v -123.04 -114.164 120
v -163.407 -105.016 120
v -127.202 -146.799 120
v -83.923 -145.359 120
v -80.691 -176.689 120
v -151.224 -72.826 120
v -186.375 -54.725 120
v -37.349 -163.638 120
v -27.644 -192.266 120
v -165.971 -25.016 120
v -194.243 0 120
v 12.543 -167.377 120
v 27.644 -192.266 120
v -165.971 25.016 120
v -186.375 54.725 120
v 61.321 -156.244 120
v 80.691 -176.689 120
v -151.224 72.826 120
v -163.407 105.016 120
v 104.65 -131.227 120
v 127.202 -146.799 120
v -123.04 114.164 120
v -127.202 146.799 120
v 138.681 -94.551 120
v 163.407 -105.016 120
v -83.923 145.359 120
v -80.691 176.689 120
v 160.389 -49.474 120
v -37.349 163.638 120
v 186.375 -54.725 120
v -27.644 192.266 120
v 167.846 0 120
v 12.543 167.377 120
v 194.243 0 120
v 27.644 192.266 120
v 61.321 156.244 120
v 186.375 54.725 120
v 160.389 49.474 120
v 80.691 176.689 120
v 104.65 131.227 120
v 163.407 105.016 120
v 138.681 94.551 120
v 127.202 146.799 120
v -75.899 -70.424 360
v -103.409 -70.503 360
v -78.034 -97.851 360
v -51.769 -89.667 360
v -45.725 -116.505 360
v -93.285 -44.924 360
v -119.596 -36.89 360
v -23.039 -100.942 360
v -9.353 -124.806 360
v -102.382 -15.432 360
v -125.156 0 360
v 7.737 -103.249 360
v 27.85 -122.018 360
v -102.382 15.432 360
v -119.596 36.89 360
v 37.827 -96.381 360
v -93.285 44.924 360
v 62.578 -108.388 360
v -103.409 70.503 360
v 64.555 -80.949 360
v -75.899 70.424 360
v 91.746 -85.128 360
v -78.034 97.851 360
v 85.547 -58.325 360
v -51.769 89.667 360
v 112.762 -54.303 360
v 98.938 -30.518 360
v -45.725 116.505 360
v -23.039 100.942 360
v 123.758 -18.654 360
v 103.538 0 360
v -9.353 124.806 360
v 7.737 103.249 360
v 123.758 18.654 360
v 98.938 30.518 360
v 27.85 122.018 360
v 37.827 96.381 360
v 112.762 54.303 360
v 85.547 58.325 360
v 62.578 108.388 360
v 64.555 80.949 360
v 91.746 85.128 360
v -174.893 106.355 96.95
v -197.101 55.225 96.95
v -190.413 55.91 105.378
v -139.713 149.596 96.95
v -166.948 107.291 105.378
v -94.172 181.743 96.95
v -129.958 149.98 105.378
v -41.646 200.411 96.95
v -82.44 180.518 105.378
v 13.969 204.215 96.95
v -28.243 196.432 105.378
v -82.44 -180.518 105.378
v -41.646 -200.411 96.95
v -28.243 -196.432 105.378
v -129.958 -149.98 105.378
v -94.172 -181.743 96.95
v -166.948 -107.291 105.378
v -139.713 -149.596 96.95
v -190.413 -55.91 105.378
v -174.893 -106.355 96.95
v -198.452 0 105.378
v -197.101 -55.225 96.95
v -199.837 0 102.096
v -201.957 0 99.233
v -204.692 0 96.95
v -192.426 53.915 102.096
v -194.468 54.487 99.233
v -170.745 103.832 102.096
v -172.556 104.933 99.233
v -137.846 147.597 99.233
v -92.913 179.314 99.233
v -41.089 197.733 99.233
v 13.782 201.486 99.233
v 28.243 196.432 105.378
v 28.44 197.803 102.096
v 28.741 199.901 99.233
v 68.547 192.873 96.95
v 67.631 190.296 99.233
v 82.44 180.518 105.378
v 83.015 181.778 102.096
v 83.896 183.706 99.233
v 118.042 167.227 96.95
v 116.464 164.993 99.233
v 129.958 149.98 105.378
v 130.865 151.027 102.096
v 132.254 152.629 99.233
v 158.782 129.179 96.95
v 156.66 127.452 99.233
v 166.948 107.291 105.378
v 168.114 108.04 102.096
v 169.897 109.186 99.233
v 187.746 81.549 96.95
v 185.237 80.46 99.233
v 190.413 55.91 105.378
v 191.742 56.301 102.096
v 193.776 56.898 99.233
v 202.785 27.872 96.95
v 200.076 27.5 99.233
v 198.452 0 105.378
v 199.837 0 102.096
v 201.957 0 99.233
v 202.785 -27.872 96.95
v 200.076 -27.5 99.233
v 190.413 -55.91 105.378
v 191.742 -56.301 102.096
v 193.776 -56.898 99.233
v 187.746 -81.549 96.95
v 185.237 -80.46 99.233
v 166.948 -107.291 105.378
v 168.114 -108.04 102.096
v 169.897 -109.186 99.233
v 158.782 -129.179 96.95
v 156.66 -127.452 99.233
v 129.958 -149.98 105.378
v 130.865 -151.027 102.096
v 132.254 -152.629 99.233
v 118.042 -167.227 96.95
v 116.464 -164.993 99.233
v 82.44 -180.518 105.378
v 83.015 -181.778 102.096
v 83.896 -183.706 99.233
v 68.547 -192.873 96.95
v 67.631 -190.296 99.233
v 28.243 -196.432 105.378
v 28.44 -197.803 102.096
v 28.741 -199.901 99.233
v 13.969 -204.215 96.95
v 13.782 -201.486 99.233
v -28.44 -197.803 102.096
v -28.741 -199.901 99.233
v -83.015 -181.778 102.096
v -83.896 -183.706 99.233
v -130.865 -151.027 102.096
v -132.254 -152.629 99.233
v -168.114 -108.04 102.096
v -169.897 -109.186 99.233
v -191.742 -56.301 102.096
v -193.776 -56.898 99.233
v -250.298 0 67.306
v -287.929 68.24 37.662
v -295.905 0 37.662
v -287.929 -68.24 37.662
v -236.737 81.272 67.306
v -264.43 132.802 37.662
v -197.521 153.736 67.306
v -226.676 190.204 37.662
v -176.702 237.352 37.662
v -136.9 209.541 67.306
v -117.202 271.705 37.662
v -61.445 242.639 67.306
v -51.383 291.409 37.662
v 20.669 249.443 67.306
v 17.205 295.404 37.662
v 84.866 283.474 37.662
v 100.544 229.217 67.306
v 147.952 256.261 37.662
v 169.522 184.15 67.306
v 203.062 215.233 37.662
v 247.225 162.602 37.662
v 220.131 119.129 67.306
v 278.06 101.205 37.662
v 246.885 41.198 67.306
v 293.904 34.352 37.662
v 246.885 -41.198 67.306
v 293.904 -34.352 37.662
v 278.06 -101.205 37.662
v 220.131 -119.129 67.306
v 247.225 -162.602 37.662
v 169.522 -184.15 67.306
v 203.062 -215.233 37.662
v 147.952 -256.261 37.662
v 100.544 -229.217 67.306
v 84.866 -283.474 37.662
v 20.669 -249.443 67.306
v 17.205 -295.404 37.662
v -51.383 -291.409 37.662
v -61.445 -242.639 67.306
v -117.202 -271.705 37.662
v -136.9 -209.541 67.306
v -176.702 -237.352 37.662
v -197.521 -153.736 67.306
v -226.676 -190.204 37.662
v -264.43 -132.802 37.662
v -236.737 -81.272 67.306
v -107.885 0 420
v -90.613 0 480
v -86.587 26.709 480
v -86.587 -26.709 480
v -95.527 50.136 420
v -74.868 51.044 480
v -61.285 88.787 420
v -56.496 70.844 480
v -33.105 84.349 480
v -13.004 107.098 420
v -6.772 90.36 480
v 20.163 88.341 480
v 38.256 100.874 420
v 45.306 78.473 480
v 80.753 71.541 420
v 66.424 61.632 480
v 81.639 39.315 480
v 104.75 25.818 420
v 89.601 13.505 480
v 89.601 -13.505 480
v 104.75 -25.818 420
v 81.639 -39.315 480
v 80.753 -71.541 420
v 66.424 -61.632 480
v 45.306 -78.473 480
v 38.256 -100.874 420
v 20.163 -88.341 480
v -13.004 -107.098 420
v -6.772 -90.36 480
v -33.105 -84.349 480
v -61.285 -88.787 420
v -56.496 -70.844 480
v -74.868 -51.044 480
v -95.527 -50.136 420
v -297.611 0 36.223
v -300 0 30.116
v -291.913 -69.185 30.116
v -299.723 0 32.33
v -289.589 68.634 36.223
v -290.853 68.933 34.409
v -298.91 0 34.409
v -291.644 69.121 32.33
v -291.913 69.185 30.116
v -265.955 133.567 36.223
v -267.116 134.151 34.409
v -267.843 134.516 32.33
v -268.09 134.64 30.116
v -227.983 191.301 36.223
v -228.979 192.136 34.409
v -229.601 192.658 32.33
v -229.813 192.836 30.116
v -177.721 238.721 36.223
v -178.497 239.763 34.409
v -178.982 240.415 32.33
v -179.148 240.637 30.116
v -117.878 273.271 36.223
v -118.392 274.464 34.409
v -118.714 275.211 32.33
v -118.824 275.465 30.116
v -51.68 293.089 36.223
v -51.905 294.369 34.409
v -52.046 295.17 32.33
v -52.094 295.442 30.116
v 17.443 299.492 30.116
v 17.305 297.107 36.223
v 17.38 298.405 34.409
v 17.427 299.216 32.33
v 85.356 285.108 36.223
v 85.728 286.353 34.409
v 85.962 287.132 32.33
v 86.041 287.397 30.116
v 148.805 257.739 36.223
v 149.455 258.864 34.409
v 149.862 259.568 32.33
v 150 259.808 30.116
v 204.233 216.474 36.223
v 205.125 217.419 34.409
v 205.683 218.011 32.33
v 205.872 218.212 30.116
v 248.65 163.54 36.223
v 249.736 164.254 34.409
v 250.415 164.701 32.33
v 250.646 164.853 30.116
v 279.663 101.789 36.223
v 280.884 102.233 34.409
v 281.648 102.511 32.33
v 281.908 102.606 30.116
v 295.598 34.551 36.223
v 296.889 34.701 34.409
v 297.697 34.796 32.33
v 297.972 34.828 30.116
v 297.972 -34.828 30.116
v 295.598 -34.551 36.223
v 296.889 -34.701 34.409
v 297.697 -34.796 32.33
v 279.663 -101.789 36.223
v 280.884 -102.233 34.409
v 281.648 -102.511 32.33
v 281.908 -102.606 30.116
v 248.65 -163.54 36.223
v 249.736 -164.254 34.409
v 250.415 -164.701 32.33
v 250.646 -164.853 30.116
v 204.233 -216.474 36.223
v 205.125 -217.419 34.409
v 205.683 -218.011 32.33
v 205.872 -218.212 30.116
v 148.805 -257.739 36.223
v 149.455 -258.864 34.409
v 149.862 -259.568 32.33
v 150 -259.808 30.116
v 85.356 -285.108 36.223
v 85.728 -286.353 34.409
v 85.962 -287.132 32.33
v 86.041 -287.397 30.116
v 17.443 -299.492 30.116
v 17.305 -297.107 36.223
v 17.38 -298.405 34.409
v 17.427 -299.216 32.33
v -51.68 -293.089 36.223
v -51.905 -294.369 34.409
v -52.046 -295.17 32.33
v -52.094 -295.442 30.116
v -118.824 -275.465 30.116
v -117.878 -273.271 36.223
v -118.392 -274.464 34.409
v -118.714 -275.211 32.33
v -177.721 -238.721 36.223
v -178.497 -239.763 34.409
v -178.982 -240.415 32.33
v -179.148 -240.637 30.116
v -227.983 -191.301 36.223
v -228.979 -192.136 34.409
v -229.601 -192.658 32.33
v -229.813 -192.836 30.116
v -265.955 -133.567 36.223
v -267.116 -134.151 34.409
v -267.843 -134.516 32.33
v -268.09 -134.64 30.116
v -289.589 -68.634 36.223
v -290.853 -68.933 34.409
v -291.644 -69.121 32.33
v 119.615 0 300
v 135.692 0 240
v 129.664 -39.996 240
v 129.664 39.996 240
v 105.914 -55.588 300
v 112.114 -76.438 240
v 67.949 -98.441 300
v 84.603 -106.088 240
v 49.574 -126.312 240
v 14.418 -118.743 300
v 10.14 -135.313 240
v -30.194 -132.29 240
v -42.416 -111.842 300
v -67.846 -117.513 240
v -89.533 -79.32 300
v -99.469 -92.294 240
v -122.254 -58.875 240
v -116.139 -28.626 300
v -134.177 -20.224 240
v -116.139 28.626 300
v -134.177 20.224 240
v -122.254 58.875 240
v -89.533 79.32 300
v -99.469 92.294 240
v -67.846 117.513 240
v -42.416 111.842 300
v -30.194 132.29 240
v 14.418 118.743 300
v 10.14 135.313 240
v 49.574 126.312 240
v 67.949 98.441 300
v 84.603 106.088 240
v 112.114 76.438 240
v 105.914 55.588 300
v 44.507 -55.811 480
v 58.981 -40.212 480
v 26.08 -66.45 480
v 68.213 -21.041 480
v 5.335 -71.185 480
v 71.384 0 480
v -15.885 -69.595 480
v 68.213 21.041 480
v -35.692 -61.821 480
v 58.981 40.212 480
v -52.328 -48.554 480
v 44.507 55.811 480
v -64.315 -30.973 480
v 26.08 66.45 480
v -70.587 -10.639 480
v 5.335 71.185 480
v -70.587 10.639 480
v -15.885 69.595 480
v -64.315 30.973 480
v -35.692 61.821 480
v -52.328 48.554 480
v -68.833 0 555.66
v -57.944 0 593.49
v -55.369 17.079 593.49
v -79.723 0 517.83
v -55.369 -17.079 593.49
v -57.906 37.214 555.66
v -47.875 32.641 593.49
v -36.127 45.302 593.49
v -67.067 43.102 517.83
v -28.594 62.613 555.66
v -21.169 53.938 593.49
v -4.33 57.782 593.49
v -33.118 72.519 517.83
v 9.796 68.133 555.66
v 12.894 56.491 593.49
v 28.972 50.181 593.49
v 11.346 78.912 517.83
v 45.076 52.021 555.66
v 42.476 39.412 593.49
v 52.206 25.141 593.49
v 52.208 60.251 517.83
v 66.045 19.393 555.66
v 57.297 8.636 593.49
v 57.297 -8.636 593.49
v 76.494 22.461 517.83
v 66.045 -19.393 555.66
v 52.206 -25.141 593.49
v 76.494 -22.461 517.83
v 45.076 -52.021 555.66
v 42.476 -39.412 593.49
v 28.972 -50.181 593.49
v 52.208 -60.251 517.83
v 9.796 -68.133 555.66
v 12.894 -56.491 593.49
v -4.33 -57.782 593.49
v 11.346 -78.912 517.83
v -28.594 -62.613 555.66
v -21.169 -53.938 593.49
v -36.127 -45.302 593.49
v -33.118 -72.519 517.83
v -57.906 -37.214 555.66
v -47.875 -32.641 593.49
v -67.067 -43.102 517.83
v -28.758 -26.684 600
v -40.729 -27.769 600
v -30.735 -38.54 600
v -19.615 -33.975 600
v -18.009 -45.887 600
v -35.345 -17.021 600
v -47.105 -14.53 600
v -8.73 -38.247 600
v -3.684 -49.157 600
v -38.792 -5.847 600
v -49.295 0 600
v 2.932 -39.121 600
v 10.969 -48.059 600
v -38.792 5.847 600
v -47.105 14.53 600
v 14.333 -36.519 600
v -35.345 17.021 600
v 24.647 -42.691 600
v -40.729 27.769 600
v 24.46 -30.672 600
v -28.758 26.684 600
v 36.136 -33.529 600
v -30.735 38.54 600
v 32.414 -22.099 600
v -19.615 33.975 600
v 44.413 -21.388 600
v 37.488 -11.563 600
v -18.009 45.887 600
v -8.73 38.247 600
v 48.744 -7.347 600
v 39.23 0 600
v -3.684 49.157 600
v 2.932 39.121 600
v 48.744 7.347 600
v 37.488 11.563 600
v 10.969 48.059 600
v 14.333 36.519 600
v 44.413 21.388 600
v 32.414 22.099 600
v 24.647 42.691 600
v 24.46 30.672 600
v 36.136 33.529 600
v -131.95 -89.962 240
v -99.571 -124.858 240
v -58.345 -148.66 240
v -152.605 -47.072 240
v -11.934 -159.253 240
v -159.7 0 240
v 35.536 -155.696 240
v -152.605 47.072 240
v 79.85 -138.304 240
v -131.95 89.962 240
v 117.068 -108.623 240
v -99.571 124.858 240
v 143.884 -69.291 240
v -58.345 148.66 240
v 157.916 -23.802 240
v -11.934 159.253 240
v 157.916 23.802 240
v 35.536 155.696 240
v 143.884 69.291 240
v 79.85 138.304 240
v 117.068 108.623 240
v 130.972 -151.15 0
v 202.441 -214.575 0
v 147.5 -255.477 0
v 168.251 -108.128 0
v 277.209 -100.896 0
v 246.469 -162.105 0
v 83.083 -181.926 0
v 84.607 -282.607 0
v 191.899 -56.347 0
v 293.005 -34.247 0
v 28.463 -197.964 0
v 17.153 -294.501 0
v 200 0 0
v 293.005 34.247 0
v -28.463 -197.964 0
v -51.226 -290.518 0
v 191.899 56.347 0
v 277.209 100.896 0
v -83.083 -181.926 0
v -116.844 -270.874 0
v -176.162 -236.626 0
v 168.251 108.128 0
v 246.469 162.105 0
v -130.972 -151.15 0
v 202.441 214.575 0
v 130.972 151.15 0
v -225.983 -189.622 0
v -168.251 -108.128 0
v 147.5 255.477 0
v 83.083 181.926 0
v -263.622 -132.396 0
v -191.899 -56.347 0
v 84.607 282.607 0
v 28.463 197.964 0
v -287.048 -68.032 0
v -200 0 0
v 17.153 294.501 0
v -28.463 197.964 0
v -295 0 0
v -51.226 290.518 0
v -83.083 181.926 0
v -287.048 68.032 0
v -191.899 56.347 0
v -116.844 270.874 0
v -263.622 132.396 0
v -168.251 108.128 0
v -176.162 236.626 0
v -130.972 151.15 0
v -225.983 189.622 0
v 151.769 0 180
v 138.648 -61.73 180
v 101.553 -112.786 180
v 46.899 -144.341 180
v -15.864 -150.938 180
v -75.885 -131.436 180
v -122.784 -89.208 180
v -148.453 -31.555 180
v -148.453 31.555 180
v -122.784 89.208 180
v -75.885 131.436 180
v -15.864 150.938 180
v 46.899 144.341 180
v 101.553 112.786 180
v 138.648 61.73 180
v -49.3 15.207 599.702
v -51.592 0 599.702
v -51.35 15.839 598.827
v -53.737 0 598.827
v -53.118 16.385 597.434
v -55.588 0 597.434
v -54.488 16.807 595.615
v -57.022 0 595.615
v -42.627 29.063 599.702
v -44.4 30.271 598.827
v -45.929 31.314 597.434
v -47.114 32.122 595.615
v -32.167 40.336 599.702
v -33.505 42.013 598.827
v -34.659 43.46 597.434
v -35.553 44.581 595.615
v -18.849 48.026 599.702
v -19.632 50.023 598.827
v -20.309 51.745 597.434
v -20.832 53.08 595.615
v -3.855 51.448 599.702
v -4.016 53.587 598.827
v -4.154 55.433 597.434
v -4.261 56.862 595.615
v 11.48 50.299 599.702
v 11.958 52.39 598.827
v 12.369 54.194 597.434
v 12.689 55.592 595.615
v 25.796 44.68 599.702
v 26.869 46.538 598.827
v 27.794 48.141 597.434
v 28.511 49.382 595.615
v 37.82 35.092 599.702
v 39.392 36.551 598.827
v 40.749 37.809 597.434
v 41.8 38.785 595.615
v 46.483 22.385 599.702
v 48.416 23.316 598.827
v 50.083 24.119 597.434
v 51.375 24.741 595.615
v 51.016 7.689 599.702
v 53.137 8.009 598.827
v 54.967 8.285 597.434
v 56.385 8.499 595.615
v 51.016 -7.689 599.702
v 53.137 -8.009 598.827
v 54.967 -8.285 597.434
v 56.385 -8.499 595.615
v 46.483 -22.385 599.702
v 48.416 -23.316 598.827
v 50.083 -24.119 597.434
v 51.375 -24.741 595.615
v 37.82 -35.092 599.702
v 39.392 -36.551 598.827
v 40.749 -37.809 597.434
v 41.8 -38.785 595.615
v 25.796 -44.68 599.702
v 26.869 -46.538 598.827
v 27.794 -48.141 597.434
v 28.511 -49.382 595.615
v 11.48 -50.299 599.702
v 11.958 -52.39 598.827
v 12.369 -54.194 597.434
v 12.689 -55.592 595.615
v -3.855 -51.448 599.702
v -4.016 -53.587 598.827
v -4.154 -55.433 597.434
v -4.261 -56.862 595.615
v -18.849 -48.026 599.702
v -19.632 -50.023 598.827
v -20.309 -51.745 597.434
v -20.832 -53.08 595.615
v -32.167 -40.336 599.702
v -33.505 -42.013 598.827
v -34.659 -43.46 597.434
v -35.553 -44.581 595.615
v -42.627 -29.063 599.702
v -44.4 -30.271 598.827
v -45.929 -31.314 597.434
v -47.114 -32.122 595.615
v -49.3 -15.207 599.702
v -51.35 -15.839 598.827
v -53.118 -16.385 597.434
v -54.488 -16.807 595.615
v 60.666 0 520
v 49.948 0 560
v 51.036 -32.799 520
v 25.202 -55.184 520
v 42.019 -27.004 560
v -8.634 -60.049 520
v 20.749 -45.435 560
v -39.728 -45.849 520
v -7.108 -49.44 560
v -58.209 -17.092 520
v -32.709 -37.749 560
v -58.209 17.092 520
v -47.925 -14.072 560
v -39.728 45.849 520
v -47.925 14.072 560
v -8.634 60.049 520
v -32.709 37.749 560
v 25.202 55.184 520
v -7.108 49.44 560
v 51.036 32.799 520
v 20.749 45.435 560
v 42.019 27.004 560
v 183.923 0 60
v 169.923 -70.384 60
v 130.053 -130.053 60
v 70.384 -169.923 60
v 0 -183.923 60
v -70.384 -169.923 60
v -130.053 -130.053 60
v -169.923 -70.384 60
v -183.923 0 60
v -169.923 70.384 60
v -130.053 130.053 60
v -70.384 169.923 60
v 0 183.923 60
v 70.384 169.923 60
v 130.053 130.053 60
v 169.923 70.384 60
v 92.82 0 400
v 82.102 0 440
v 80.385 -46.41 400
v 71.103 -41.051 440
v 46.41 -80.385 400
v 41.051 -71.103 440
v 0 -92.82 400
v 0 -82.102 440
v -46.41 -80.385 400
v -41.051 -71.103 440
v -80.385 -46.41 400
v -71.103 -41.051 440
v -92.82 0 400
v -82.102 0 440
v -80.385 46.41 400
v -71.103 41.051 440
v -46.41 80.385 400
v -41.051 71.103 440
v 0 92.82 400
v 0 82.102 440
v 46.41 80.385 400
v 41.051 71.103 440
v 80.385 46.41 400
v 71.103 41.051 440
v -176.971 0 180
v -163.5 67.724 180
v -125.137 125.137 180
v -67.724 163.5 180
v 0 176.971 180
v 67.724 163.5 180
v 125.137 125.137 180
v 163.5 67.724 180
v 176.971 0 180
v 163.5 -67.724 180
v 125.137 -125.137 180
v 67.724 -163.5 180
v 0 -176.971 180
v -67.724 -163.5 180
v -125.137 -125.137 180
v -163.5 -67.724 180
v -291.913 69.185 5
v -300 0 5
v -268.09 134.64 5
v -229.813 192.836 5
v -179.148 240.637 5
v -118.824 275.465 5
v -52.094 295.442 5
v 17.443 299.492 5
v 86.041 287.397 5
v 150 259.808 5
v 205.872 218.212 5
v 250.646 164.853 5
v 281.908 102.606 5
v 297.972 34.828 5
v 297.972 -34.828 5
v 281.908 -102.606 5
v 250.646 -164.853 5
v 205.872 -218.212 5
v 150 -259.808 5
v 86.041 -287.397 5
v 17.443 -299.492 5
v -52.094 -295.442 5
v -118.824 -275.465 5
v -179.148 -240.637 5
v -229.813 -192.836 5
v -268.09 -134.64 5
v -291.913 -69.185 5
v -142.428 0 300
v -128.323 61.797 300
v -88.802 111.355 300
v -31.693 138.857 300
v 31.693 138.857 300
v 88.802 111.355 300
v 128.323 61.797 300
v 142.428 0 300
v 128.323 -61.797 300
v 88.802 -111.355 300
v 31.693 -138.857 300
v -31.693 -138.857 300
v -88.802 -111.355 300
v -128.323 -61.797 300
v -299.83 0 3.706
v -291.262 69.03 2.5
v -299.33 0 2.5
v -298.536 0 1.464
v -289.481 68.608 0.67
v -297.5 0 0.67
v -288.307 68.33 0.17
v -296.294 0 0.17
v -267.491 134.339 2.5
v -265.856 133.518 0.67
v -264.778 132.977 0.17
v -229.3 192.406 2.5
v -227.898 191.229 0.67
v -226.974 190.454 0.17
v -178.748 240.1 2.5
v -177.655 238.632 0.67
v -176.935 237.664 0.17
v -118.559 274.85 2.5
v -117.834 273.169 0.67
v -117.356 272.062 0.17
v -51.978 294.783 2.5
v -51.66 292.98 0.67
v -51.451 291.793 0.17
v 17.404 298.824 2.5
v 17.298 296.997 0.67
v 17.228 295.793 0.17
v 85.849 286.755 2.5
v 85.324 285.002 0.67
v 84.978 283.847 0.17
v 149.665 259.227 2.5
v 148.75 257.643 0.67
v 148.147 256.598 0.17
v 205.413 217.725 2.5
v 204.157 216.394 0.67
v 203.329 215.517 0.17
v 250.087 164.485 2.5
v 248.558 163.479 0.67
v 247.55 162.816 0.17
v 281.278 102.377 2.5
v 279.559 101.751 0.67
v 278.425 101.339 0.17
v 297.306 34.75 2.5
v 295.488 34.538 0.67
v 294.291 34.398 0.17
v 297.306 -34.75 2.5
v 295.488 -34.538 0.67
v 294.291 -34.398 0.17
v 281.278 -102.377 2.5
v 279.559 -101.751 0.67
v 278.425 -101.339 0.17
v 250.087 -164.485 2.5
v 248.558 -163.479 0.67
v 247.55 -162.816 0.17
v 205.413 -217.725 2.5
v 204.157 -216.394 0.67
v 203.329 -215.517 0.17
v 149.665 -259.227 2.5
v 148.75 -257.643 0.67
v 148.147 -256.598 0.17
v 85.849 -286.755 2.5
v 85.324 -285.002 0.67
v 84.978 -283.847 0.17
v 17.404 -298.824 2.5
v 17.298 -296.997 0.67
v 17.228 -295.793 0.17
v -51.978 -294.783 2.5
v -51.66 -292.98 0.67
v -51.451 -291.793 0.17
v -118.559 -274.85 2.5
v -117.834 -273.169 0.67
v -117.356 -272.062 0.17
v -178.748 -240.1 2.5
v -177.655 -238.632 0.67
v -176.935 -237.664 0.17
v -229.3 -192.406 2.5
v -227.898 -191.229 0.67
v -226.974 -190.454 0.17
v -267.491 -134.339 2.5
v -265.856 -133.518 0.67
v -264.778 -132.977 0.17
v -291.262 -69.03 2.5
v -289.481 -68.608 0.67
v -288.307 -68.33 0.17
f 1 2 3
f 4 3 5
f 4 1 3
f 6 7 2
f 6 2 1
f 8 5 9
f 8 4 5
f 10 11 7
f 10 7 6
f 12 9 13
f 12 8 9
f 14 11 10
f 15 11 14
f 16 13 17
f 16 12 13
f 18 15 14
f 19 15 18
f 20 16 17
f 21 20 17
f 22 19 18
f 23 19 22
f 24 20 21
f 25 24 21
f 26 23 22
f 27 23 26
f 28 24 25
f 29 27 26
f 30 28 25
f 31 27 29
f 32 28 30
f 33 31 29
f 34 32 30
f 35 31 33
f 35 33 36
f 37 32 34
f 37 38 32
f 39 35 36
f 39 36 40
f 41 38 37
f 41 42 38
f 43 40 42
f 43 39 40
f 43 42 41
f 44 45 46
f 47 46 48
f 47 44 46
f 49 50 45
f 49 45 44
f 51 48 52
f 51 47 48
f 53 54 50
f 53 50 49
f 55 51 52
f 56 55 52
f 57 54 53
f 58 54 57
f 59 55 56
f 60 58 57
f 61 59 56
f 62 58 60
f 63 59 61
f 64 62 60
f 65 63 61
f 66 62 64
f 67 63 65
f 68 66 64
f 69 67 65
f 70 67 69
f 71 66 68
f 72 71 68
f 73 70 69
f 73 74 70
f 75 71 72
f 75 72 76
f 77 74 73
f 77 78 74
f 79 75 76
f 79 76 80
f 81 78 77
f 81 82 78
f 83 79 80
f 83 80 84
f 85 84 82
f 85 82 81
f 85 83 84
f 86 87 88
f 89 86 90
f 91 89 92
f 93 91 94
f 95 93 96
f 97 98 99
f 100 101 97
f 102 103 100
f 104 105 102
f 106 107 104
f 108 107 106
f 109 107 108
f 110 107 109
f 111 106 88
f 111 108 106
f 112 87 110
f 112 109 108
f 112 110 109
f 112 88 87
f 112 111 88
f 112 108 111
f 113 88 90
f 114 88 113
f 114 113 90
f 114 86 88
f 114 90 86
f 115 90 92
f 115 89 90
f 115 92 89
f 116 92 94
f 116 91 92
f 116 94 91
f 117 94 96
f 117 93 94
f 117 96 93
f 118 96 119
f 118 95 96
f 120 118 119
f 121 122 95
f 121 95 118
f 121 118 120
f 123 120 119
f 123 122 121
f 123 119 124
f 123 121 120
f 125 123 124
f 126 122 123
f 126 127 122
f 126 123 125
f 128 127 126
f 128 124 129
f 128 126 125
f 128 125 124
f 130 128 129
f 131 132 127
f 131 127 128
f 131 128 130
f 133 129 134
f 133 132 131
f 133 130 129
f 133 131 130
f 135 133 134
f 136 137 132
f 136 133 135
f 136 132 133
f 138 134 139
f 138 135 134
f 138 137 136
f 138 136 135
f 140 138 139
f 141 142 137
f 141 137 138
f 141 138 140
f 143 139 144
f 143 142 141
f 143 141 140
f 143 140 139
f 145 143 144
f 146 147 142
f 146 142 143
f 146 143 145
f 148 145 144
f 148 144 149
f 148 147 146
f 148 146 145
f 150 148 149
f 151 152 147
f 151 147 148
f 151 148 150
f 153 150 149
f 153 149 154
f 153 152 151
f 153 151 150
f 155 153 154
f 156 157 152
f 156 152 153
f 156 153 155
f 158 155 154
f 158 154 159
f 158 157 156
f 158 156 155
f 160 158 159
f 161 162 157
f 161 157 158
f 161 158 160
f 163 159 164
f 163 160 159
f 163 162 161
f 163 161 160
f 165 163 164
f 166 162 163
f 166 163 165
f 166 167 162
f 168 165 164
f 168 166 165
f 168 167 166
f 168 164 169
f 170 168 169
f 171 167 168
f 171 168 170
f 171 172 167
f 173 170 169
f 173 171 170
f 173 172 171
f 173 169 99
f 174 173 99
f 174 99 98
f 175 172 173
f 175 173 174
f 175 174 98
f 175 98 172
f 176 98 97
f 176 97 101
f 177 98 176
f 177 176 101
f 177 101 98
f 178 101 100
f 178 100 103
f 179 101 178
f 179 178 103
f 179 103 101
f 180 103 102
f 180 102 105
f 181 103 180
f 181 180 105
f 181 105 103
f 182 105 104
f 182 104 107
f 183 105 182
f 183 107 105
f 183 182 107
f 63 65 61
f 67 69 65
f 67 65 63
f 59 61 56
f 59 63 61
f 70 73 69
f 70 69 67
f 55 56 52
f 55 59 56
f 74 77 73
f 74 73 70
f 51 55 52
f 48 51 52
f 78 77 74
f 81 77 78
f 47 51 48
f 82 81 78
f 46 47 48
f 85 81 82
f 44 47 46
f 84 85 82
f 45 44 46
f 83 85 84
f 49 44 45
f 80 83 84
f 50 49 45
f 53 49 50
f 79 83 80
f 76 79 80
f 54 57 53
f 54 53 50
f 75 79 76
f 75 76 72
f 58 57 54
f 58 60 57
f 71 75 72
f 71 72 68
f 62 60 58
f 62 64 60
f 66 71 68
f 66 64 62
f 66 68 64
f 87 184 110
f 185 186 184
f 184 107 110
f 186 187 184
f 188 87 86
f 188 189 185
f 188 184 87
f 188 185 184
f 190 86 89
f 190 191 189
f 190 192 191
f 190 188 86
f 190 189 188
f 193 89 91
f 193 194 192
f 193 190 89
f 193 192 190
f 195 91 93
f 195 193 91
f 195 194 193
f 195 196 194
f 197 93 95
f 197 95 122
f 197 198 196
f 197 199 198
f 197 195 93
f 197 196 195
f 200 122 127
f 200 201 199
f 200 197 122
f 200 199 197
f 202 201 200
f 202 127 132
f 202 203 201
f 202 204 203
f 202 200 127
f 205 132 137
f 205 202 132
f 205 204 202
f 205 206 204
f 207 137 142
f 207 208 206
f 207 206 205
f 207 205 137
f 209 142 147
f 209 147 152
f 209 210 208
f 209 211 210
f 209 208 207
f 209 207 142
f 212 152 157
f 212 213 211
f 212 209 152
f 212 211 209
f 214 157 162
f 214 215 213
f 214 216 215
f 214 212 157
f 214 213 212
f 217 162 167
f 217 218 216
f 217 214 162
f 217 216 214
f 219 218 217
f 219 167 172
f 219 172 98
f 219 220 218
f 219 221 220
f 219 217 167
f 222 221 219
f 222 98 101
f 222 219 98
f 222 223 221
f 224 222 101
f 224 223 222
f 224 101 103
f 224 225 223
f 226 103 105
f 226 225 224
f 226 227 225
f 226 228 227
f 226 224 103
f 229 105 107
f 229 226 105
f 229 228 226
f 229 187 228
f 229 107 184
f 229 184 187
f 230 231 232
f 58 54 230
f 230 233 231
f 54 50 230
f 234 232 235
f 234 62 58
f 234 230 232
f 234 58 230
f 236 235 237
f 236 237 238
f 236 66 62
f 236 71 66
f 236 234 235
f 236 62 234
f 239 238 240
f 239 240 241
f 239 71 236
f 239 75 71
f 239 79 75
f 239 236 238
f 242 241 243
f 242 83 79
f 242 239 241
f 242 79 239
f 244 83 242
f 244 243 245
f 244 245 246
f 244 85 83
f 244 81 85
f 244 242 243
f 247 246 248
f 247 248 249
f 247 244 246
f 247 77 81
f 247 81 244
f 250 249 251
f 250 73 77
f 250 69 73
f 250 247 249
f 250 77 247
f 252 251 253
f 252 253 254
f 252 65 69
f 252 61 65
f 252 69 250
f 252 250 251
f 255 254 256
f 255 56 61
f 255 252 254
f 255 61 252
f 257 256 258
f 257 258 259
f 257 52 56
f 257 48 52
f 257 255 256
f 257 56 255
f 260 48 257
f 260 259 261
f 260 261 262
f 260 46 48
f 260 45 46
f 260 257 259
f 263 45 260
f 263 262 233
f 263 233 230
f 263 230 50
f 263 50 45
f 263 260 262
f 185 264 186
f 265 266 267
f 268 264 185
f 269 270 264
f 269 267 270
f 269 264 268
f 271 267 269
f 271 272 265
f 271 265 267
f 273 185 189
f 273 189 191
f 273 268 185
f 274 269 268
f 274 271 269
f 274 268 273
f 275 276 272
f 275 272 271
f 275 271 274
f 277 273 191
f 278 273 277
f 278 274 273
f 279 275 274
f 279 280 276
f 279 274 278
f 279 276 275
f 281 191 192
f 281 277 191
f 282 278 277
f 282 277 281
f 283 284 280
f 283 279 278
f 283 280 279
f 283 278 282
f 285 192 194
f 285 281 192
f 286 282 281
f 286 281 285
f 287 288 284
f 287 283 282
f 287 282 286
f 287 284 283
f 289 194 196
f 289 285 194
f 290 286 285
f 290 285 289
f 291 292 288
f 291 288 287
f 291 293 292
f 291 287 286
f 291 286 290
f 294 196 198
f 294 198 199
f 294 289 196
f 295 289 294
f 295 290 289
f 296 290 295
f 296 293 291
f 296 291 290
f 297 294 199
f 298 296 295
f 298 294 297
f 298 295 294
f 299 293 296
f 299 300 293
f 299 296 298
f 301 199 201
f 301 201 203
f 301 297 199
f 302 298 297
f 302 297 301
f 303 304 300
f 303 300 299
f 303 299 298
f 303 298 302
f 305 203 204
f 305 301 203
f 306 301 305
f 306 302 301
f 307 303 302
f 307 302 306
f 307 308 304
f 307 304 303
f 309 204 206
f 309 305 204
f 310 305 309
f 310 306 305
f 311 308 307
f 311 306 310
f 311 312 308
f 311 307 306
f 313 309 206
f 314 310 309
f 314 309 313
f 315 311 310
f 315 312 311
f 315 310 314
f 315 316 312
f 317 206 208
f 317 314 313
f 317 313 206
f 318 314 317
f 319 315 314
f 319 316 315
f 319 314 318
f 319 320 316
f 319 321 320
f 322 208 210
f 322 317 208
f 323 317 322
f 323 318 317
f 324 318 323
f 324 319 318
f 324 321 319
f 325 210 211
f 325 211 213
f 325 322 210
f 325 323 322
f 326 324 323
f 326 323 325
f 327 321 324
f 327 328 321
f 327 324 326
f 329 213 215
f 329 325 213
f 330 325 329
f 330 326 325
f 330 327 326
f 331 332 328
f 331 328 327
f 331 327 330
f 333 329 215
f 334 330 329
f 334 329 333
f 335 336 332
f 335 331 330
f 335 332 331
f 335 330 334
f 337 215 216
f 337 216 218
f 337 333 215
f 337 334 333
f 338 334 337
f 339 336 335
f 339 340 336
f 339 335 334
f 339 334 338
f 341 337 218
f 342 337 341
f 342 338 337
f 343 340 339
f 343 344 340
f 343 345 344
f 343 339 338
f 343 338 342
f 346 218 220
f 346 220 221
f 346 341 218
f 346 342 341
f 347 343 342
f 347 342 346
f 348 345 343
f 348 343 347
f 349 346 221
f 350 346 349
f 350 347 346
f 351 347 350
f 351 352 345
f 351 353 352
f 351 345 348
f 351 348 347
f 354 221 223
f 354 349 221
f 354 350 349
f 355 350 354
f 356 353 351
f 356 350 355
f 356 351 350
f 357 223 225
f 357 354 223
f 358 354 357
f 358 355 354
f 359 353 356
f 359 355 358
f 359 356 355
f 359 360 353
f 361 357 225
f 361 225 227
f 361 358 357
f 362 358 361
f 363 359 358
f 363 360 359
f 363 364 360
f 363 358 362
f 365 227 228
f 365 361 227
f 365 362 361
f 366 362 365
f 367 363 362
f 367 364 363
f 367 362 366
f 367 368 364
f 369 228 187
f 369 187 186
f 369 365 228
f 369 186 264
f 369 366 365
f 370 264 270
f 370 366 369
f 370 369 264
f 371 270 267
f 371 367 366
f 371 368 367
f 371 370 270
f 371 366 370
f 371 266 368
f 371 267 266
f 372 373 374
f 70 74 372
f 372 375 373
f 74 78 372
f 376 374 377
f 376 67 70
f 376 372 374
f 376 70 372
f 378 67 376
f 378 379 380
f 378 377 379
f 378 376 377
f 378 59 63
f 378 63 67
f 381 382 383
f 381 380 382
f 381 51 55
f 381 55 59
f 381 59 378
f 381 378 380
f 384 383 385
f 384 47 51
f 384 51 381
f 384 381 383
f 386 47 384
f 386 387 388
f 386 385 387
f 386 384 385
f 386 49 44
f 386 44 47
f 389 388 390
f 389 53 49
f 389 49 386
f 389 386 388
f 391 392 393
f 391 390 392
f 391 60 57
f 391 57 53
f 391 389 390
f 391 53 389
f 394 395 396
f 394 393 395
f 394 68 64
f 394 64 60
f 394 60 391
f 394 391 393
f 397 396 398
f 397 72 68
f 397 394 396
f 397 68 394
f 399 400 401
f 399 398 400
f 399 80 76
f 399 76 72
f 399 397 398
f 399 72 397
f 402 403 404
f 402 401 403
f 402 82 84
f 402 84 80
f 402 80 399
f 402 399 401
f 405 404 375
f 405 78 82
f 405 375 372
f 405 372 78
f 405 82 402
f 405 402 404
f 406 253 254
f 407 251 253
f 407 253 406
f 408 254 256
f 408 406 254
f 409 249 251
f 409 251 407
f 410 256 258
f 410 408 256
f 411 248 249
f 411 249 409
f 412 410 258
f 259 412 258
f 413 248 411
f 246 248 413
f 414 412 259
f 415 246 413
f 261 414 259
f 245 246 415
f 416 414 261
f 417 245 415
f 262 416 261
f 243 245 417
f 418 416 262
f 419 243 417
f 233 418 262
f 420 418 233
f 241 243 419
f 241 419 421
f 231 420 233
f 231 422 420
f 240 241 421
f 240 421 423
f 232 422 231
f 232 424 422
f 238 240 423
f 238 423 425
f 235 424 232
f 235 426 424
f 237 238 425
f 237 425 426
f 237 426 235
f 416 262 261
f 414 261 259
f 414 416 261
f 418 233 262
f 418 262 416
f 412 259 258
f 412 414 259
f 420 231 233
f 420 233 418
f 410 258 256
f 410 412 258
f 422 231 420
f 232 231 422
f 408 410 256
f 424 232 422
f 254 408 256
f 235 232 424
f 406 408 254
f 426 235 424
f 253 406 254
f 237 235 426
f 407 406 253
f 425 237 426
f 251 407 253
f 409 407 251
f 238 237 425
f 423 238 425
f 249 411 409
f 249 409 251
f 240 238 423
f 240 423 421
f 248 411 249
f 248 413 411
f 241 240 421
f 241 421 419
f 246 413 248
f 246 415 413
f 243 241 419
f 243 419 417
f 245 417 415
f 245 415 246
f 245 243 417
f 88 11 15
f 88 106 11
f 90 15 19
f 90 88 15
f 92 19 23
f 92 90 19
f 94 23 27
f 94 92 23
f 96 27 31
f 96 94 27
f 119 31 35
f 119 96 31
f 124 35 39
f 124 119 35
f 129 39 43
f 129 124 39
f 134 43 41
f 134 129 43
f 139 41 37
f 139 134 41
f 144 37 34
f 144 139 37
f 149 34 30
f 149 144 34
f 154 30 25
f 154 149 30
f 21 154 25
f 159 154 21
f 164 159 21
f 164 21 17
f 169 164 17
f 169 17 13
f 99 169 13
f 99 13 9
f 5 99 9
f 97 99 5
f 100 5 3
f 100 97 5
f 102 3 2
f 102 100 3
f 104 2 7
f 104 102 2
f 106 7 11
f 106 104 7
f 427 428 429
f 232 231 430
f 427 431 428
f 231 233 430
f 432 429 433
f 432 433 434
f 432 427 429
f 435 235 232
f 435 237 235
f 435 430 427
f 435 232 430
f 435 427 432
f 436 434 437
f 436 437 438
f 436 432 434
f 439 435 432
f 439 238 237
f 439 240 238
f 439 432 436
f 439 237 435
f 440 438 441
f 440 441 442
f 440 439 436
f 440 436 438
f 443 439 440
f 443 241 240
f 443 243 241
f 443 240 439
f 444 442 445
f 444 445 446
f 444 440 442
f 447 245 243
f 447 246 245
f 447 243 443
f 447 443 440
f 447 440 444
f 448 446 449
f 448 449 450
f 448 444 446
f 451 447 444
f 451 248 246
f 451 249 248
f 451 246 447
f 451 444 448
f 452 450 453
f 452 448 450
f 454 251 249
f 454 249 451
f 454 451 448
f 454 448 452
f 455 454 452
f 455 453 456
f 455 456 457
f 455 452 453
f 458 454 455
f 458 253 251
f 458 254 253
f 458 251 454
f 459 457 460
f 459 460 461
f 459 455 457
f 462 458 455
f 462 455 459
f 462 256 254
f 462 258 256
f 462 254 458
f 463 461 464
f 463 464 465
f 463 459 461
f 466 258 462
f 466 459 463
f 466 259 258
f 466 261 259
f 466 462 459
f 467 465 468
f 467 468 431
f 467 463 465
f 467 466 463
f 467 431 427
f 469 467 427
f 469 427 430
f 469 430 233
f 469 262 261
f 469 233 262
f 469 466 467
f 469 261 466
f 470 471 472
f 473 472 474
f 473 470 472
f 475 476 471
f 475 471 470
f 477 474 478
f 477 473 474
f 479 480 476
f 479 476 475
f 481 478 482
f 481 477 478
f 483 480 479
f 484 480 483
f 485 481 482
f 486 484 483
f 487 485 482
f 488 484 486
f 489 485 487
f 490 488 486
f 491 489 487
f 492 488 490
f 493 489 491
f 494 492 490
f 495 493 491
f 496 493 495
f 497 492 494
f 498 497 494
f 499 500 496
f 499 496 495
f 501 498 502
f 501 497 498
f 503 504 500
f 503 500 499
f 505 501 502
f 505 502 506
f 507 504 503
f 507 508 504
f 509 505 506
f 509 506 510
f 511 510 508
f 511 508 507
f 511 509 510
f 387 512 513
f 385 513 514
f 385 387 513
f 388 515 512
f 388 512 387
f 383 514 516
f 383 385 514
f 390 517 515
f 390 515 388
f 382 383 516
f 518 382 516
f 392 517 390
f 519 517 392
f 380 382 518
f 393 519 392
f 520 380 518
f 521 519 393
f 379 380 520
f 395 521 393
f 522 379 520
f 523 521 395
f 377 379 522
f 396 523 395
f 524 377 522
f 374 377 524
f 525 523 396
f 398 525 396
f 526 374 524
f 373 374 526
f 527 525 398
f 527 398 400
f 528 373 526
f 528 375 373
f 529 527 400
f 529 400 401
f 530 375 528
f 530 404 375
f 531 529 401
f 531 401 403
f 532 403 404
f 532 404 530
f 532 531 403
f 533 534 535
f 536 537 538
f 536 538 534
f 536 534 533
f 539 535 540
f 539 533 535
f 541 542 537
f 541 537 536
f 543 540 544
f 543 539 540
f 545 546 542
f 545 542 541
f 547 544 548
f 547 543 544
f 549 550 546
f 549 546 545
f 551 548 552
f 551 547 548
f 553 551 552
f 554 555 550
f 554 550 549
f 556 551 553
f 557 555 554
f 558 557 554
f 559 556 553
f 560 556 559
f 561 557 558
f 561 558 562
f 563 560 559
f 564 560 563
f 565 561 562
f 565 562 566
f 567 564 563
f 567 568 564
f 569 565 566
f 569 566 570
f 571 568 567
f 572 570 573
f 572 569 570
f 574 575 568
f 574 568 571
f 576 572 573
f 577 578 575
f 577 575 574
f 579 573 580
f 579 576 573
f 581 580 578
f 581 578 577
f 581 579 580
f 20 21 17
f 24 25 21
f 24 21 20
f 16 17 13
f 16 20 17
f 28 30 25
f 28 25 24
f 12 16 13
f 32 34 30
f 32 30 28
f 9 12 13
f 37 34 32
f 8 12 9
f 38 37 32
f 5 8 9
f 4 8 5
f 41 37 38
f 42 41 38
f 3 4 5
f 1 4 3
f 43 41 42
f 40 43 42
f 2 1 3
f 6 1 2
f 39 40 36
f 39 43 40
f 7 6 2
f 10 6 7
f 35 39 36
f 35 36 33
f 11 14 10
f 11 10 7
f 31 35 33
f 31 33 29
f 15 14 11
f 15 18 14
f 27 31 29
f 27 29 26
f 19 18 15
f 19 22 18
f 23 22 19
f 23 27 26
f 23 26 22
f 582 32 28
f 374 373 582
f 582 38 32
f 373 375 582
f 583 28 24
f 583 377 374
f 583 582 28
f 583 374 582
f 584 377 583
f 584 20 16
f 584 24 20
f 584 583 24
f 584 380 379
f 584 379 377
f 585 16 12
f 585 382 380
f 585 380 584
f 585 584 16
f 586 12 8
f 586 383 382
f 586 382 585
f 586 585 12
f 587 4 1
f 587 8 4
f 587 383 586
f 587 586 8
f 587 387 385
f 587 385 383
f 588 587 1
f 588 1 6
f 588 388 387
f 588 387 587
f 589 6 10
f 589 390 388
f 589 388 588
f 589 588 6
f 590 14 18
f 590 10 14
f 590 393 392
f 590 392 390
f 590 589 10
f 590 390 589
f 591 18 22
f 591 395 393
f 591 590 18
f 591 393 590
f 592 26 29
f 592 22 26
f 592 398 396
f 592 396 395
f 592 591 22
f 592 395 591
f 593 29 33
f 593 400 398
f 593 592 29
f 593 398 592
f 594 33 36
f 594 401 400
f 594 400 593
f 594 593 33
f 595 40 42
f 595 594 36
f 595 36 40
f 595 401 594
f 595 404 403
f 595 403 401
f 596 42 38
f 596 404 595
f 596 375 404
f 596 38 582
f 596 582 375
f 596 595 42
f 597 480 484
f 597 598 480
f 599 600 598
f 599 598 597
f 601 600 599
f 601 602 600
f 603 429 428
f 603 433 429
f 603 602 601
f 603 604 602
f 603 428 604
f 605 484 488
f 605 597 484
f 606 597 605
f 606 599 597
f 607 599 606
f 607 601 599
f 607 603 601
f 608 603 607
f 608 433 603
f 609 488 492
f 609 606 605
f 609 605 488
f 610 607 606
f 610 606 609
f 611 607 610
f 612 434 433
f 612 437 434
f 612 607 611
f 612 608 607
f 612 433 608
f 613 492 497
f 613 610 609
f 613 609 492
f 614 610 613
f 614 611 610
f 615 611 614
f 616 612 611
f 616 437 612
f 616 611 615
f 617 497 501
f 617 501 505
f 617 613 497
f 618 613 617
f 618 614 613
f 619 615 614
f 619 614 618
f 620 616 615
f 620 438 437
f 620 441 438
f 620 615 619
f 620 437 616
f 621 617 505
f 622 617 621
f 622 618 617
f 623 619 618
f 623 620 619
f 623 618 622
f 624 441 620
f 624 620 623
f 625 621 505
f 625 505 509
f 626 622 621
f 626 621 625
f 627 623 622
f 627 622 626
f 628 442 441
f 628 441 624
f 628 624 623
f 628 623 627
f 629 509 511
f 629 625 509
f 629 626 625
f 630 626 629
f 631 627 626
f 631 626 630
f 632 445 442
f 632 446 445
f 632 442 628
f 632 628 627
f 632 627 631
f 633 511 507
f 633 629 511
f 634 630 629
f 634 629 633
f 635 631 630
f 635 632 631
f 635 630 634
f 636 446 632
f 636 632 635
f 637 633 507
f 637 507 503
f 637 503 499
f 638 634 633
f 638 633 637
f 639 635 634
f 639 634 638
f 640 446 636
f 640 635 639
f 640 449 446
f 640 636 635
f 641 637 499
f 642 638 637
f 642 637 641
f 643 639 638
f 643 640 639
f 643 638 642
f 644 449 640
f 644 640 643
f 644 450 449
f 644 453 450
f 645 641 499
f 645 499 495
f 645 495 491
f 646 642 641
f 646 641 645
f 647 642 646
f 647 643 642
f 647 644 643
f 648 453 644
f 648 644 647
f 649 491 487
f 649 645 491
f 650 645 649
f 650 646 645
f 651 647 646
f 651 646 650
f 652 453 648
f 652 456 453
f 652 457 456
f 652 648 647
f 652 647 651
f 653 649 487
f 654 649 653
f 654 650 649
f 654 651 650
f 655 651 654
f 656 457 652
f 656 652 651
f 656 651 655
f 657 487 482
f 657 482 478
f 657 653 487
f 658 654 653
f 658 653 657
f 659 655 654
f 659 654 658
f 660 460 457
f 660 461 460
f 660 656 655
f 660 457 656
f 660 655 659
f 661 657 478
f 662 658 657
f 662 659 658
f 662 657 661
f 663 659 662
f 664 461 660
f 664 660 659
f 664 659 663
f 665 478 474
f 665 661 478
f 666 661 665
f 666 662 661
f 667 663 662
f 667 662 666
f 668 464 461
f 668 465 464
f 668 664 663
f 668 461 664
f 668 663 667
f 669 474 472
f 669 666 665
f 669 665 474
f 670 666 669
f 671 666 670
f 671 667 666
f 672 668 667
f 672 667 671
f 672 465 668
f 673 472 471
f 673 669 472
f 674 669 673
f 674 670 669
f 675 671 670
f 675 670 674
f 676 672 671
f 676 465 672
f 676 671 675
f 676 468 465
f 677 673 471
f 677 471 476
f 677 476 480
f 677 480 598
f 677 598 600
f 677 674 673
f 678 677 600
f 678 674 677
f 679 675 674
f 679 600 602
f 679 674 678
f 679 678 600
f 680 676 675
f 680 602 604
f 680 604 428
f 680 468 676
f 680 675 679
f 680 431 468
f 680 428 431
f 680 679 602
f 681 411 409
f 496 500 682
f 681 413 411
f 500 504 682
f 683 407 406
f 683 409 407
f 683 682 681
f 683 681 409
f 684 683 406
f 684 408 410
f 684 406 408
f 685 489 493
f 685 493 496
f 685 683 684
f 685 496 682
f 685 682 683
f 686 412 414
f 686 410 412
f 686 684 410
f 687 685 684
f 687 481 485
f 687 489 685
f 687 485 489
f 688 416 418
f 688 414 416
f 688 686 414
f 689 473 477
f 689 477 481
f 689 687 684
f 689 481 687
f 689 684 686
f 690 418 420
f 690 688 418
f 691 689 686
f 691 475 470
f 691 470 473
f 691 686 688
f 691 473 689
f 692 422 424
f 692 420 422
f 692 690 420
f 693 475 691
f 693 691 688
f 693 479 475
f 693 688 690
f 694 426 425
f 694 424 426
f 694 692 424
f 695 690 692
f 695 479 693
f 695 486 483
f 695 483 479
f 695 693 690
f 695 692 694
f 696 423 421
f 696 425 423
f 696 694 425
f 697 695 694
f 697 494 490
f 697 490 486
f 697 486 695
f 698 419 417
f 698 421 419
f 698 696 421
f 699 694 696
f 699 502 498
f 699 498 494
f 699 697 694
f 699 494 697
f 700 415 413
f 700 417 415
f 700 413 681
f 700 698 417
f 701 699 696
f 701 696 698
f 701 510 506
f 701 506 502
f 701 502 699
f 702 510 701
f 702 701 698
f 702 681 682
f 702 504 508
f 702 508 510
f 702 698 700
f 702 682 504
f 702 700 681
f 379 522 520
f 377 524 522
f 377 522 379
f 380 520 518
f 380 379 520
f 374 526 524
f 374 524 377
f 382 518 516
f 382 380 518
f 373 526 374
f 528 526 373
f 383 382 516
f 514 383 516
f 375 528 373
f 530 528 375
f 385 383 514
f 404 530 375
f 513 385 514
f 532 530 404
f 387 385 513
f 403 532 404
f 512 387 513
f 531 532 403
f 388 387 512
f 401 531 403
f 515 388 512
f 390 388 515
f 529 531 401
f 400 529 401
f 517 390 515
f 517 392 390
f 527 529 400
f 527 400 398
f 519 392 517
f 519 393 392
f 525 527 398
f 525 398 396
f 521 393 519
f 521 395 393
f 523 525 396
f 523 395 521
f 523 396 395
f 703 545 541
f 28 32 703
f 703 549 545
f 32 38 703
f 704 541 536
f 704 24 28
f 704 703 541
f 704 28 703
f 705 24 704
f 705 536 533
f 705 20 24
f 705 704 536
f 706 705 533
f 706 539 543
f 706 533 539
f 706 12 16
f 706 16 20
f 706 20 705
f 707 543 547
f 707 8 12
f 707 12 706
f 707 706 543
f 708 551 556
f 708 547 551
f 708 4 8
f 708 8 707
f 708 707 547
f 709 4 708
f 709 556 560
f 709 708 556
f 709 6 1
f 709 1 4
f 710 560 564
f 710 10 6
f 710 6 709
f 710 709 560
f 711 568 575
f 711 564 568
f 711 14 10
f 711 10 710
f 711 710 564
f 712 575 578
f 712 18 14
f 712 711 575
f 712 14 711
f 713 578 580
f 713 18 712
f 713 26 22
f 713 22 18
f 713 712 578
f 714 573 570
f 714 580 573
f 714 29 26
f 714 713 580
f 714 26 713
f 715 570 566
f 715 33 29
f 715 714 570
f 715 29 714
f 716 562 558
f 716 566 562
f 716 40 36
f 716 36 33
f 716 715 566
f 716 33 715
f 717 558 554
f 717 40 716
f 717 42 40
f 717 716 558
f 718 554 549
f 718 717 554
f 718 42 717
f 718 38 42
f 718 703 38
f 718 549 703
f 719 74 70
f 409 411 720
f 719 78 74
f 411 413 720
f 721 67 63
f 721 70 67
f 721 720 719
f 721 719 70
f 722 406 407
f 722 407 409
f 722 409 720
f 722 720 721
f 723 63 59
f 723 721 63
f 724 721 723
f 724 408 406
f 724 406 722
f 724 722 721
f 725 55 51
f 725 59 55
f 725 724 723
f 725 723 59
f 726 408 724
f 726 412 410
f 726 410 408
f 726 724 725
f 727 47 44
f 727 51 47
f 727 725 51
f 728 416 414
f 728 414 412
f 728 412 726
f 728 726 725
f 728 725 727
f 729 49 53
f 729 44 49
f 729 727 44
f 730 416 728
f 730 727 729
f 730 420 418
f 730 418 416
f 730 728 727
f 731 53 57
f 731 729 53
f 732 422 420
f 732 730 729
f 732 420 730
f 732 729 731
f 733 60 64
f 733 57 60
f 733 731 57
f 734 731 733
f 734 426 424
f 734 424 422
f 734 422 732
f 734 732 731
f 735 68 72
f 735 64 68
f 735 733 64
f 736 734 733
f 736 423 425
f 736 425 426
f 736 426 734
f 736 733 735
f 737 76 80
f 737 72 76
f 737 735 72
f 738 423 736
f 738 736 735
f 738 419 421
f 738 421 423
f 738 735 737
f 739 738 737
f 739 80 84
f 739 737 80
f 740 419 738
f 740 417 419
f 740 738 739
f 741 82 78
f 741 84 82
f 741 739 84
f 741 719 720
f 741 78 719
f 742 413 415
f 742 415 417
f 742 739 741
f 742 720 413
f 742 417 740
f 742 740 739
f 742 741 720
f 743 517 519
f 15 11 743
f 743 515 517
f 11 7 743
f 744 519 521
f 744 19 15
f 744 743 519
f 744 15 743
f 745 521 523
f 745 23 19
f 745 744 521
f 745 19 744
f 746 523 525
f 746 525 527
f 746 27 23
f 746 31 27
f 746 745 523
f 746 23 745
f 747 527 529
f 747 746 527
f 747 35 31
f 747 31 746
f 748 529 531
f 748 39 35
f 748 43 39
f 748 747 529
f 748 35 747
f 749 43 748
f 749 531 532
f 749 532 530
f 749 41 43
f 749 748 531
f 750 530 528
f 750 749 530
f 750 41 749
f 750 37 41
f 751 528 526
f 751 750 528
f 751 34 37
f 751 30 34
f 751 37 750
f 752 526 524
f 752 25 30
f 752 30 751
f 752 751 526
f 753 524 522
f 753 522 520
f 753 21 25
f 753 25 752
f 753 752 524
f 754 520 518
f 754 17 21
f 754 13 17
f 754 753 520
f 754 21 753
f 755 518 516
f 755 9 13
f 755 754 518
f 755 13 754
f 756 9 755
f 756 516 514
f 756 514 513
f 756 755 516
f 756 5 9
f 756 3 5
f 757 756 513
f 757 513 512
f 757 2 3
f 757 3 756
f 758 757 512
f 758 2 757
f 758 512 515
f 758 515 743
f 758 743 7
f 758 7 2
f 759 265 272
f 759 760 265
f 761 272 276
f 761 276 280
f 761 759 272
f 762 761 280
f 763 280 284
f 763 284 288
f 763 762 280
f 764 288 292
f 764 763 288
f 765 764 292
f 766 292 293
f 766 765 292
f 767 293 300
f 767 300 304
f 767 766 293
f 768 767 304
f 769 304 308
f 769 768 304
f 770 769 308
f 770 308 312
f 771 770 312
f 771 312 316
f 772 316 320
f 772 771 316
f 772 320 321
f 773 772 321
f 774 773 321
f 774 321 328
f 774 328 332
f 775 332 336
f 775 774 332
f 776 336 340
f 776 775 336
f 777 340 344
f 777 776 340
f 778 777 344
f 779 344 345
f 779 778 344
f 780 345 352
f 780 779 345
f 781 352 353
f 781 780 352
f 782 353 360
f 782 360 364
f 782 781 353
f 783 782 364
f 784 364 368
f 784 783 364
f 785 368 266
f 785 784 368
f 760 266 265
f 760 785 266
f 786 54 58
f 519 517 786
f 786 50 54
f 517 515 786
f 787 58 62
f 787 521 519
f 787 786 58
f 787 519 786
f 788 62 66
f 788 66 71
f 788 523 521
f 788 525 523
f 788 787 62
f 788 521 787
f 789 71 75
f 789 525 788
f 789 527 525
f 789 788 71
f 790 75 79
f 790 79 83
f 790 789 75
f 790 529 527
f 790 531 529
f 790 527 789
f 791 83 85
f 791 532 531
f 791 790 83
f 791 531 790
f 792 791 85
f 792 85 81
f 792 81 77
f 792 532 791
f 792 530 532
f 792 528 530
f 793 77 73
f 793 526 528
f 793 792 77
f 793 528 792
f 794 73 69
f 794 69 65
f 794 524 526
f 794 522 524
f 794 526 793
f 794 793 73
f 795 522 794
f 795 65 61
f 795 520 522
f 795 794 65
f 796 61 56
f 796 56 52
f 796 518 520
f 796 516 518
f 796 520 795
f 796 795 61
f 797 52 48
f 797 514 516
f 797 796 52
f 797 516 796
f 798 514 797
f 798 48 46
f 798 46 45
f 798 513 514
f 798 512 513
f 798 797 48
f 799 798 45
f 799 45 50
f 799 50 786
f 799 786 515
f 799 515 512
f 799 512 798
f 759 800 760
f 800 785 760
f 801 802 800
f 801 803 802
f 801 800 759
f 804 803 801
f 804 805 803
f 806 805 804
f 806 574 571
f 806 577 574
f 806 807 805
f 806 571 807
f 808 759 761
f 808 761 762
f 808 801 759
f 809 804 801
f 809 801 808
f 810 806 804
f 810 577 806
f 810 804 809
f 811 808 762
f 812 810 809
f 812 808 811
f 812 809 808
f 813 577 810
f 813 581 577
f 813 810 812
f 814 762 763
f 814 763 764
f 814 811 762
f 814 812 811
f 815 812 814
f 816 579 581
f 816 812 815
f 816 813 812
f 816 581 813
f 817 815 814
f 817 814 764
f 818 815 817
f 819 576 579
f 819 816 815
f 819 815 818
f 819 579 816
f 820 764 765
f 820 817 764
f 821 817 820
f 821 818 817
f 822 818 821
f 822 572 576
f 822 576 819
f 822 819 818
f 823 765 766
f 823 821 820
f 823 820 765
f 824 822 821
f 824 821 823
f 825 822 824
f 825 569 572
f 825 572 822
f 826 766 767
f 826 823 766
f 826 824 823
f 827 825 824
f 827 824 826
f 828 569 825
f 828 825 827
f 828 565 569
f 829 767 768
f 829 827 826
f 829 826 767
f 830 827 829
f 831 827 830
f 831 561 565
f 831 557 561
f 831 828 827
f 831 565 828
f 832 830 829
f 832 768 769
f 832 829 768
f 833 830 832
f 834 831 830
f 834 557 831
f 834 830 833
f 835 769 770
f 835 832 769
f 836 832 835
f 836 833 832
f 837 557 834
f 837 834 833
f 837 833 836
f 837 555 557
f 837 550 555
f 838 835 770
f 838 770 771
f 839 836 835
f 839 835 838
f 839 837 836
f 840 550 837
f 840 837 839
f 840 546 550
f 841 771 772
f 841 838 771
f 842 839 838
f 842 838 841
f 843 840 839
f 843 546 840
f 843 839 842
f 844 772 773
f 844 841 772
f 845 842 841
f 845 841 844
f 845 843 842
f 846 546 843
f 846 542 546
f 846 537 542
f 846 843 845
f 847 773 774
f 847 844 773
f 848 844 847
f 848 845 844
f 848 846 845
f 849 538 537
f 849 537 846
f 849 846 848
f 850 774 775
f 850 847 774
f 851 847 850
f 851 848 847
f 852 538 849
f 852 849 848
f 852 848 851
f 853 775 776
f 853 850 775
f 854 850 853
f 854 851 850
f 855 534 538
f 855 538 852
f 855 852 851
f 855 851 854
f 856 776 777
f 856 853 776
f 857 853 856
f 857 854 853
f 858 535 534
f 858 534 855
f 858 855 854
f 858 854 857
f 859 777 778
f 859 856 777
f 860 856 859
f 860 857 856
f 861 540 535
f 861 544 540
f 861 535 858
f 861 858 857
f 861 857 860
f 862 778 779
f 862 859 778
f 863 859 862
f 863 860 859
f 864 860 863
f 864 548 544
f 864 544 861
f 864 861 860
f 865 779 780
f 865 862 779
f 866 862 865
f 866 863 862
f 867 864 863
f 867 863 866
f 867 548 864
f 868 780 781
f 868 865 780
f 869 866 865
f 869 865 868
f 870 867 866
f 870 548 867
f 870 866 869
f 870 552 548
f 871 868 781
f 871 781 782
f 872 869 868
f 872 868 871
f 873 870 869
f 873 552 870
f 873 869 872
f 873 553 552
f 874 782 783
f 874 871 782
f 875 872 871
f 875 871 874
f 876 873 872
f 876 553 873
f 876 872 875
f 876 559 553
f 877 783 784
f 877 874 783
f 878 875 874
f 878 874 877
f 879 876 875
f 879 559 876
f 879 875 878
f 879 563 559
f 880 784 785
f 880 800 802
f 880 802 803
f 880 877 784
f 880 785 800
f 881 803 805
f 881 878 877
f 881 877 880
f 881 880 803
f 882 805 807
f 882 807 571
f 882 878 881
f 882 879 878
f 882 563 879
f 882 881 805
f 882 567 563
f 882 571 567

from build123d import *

# Parameters (mm, degrees)
F6_R     = 200
F7_DEPTH = 600.001
F7_TAPER = 15


with BuildPart() as f1:
    # F0 (on Front) → F1 (revolve)
    with BuildSketch(Plane.XZ):
        with BuildLine():
            Line((-90.612946863, 480), (0, 480))
            Line((0, 480), (0, 600))
            Line((0, 600), (-49.294946311, 600))
            ThreePointArc((-49.294946311, 600), (-54.7075782588, 598.1905087022), (-57.9437412272, 593.489647866))
            Line((-57.9437412272, 593.489647866), (-90.612946863, 480))
        make_face()
    revolve(axis=Axis((0, 0, 300), (0, 0, -1)))


with BuildPart() as f2:
    # F0 (on Front) → F2 (revolve)
    with BuildSketch(Plane.XZ):
        Polygon((-125.156226801, 360), (0, 360), (0, 480), (-90.612946863, 480), align=None)
    revolve(axis=Axis((0, 0, 300), (0, 0, -1)))


with BuildPart() as f3:
    # F0 (on Front) → F3 (revolve)
    with BuildSketch(Plane.XZ):
        Polygon((-159.699506739, 240), (0, 240), (0, 360), (-125.156226801, 360), align=None)
    revolve(axis=Axis((0, 0, 300), (0, 0, -1)))


with BuildPart() as f4:
    # F0 (on Front) → F4 (revolve)
    with BuildSketch(Plane.XZ):
        Polygon((-194.242786677, 120), (0, 120), (0, 240), (-159.699506739, 240), align=None)
    revolve(axis=Axis((0, 0, 300), (0, 0, -1)))


with BuildPart() as f5:
    # F0 (on Front) → F5 (revolve)
    with BuildSketch(Plane.XZ):
        with BuildLine():
            Line((-295, 0), (0, 0))
            Line((0, 0), (0, 120))
            Line((0, 120), (-194.242786677, 120))
            Line((-194.242786677, 120), (-198.4520183953, 105.37753777))
            ThreePointArc((-198.4520183953, 105.37753777), (-200.8115619505, 100.6009097054), (-204.6918513301, 96.9502966354))
            Line((-204.6918513301, 96.9502966354), (-295.9048951554, 37.661818149))
            ThreePointArc((-295.9048951554, 37.661818149), (-298.910248302, 34.4086069619), (-300, 30.1158256023))
            Line((-300, 30.1158256023), (-300, 5))
            ThreePointArc((-300, 5), (-298.5355339059, 1.4644660941), (-295, 0))
        make_face()
    revolve(axis=Axis((0, 0, 300), (0, 0, -1)))


with BuildPart() as f7_tool:
    # F6 (on face) → F7 (new body, through all)
    with BuildSketch(Plane(origin=(0, 0, 0), x_dir=(1, 0, 0), z_dir=(0, 0, -1))):
        Circle(F6_R)
    extrude(amount=-F7_DEPTH, taper=F7_TAPER)


with BuildPart() as f1_1:
    add(f1.part)

    # F7: cut by f7_tool
    add(f7_tool.part, mode=Mode.SUBTRACT)


with BuildPart() as f2_1:
    add(f2.part)

    # F7: cut by f7_tool
    add(f7_tool.part, mode=Mode.SUBTRACT)


with BuildPart() as f3_1:
    add(f3.part)

    # F7: cut by f7_tool
    add(f7_tool.part, mode=Mode.SUBTRACT)


with BuildPart() as f4_1:
    add(f4.part)

    # F7: cut by f7_tool
    add(f7_tool.part, mode=Mode.SUBTRACT)


with BuildPart() as f5_1:
    add(f5.part)

    # F7: cut by f7_tool
    add(f7_tool.part, mode=Mode.SUBTRACT)


solid = Compound([f1_1.part, f2_1.part, f3_1.part, f4_1.part, f5_1.part])
